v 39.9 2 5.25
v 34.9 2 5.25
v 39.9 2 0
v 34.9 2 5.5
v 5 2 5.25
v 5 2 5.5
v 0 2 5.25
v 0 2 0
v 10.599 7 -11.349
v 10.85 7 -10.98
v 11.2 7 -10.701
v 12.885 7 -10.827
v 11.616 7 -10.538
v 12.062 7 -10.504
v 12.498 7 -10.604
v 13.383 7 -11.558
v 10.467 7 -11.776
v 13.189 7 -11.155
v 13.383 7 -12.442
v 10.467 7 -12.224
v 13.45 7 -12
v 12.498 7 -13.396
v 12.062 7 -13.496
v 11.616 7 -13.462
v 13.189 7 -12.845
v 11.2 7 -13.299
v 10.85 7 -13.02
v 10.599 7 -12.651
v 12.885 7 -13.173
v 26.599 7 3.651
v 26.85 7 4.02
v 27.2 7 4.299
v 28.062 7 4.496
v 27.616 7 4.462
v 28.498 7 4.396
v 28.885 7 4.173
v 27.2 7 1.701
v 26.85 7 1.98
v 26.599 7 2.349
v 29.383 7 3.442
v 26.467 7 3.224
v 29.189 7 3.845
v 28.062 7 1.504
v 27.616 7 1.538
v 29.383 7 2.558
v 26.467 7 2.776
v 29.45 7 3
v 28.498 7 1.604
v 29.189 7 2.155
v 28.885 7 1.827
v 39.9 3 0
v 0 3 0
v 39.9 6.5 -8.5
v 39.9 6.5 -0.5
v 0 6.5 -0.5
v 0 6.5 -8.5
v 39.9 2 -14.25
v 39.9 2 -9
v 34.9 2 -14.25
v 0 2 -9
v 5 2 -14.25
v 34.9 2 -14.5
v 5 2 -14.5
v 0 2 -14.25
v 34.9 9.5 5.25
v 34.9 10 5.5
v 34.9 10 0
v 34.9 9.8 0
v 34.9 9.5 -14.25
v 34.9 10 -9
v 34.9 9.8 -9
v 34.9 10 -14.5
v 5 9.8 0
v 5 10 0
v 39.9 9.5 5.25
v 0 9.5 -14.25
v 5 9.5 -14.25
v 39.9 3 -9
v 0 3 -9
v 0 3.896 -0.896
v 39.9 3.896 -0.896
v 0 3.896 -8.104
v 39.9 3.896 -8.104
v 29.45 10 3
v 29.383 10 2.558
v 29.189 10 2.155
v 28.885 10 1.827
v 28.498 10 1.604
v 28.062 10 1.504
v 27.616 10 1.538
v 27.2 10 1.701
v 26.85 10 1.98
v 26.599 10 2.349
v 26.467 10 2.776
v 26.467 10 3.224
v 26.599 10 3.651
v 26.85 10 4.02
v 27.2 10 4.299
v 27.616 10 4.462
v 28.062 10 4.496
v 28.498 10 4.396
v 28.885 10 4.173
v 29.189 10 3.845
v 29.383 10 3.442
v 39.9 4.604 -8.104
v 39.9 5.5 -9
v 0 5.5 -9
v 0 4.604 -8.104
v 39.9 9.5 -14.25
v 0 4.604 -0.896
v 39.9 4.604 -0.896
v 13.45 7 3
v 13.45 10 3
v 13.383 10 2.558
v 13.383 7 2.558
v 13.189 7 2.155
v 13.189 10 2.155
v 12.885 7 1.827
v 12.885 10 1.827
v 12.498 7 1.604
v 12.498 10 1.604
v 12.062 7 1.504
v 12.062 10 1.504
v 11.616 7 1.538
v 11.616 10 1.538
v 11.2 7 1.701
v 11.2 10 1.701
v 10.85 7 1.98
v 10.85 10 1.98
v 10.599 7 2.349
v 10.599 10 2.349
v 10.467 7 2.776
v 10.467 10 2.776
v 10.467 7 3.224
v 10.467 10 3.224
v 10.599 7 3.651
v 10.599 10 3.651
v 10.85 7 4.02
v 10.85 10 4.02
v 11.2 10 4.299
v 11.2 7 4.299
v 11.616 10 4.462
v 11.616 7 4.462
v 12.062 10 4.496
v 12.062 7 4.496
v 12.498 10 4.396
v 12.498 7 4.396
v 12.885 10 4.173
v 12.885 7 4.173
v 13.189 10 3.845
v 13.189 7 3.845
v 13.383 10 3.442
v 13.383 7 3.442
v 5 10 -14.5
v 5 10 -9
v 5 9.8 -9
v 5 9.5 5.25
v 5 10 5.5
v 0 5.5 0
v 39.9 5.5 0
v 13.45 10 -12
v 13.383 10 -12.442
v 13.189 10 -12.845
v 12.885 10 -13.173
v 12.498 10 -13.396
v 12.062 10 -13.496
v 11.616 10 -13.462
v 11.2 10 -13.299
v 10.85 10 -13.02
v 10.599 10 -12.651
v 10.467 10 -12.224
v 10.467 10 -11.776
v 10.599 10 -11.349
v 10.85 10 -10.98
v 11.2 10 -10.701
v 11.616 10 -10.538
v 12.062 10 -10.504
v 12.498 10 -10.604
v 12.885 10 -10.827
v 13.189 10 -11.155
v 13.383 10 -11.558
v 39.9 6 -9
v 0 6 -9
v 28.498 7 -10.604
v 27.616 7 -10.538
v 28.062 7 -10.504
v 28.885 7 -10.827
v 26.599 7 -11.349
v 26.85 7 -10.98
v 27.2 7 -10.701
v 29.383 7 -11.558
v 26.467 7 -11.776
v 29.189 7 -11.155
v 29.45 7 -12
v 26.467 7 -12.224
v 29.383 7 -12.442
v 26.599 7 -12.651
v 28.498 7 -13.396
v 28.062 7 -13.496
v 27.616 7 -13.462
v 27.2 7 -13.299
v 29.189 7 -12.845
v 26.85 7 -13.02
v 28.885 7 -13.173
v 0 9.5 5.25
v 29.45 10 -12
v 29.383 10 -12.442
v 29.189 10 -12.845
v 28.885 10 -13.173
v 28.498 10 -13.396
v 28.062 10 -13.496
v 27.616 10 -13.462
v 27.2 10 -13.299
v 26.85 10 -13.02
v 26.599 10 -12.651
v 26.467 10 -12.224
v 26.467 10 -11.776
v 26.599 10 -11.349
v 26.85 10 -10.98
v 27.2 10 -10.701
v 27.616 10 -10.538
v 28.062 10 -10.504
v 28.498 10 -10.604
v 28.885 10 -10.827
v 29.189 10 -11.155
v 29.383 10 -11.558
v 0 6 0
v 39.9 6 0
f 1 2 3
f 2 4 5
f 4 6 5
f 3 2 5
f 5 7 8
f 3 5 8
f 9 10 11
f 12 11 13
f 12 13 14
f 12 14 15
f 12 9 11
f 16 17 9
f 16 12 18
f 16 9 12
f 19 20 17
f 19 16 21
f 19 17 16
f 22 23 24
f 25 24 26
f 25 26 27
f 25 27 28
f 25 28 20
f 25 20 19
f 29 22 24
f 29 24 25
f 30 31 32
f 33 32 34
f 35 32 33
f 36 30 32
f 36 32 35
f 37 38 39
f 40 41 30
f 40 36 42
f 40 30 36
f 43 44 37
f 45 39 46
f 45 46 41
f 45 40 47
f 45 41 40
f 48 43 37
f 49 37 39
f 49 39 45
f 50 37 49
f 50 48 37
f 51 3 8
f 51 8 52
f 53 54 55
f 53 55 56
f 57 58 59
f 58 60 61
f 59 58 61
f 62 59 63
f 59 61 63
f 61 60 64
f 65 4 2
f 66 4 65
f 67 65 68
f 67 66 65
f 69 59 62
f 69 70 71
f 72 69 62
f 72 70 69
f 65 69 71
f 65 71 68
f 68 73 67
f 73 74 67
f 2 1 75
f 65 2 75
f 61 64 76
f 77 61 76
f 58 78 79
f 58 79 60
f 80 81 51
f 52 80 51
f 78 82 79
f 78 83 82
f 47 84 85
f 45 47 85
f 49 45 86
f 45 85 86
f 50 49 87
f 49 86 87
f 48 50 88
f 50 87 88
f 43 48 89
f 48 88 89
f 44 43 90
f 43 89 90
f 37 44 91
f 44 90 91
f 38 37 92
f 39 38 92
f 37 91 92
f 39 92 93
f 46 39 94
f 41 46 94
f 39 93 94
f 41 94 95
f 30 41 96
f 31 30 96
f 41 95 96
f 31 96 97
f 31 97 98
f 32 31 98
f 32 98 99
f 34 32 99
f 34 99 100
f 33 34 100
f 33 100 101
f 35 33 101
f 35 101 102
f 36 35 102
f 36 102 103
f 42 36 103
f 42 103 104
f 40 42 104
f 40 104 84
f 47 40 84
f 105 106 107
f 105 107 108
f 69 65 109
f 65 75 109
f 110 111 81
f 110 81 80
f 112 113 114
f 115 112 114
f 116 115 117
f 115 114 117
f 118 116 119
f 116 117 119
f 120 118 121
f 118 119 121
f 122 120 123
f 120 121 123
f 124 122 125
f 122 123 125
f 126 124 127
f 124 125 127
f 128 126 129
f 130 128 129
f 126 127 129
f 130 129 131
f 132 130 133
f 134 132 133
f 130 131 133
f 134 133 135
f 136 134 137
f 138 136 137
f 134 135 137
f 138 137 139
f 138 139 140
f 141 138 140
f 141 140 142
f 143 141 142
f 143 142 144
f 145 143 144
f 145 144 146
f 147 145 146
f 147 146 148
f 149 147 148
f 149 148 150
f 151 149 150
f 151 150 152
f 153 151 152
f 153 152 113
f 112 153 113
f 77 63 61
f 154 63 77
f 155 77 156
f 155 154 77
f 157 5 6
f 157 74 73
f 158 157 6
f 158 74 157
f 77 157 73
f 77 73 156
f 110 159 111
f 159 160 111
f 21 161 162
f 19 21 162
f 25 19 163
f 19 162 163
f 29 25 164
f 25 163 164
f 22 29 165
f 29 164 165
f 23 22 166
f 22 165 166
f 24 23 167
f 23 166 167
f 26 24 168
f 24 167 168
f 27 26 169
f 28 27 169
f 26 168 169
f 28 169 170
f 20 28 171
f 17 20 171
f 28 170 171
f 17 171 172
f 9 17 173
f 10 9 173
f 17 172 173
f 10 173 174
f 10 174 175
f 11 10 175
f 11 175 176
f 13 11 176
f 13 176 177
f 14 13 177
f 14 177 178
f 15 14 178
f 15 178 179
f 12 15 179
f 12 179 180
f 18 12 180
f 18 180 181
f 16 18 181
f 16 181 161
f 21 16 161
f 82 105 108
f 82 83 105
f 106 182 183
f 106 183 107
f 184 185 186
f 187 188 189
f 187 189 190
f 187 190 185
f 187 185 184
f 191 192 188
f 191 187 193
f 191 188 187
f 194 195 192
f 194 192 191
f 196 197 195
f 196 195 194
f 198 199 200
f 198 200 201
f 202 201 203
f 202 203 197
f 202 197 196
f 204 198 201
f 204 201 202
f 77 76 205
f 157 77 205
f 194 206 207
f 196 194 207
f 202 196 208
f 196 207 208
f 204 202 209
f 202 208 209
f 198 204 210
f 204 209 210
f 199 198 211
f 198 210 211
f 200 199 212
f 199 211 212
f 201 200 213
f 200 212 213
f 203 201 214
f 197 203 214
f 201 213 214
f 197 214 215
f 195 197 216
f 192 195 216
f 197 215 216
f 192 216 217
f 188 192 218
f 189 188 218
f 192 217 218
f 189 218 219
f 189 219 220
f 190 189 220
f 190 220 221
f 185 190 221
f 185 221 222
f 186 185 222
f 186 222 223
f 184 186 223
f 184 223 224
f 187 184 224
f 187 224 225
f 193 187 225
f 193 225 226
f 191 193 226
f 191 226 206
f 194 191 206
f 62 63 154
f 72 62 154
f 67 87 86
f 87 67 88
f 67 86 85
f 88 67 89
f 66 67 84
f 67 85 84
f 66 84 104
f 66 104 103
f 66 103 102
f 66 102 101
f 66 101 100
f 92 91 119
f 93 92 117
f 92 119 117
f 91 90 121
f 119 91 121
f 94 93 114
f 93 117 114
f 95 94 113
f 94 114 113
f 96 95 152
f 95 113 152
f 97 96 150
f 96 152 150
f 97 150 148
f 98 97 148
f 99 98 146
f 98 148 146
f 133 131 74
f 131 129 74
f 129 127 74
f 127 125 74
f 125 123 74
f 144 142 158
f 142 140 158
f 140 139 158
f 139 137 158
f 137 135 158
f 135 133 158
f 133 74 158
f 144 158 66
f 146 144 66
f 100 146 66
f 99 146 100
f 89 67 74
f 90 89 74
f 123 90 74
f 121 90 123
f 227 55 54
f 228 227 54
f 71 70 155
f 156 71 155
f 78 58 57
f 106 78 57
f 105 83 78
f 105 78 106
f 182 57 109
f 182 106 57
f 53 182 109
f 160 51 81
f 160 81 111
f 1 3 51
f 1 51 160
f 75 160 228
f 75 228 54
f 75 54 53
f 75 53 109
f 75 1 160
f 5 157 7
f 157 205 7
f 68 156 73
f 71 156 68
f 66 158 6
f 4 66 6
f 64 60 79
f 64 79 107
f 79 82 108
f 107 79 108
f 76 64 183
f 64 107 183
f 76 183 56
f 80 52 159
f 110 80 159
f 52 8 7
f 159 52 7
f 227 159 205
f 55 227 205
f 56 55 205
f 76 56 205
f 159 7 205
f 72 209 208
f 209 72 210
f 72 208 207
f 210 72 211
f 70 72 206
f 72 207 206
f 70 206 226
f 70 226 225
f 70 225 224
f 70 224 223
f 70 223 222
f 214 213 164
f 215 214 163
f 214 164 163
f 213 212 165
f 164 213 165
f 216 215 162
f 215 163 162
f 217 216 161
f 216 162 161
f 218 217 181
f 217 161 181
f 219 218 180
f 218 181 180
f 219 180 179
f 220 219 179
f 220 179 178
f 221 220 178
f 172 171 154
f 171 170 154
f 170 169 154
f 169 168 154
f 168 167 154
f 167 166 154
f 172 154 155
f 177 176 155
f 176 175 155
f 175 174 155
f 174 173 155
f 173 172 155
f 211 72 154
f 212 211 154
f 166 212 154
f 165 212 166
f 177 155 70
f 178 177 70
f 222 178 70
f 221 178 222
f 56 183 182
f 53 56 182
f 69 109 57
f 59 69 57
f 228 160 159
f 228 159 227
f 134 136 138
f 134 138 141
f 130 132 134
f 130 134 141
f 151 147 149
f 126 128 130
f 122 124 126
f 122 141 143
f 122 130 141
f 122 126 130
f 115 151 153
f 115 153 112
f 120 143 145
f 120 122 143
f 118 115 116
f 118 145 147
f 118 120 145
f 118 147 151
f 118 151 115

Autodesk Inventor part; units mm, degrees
ref_plane "YZ Plane" through (0, 0, 0) normal (1, 0, 0) x (0, 1, 0)
ref_plane "XZ Plane" through (0, 0, 0) normal (0, 1, 0) x (-1, 0, 0)
sketch "Sketch1" plane through (0, 0, 0) normal (1, 0, 0) x (0, 1, 0)
  line L0 (0, 0) -> (2, 0)
  line L1 (6.5, 0) -> (6.5, -9)
  line L2 (6.5, -9) -> (2, -9)
  line L3 (0, -9) -> (0, 0)
  line L4 (10, 5.5) -> (2, 5.5)
  line L5 (2, 5.5) -> (2, 0)
  line L6 (2, -14.5) -> (10, -14.5)
  line L7 (10, -14.5) -> (10, 5.5)
  line L8 (10, -4.5) -> (6.5, -4.5)
  line L9 (2, 0) -> (6.5, 0)
  line L10 (2, 0) -> (2, -14.5)
  line L11 (2, -9) -> (0, -9)
  dimension "d0" = 6.5
  dimension "d1" = 9
  dimension "d3" = 10
  dimension "d4" = 20
  dimension "d5" = 2
extrude "Extrusion1" add sketch "Sketch1" along normal blind 39.9 contours L5 L4 L7 L8 L1 L9 | L2 L1 L8 L7 L6 L10
sketch "Sketch2" plane through (39.9, 0, 0) normal (1, 0, 0) x (0, 0, -1)
  line L0 (0, 6.5) -> (9, 6.5) projected
  line L1 (9, 6.5) -> (9, 2) projected
  line L2 (9, 2) -> (14.5, 2) projected
  line L3 (14.5, 2) -> (14.5, 10) projected
  line L4 (14.5, 10) -> (-5.5, 10) projected
  line L5 (-5.5, 10) -> (-5.5, 2) projected
  line L6 (-5.5, 2) -> (0, 2) projected
  line L7 (0, 2) -> (0, 6.5) projected
  line L8 (0, 5.5) -> (1.25, 4.25)
  line L9 (1.25, 4.25) -> (0, 3)
  line L10 (9, 5.5) -> (7.75, 4.25)
  line L11 (7.75, 4.25) -> (9, 3)
  line L12 (9, 6.5) -> (9, 2) projected
  line L13 (9, 5.5) -> (0, 5.5)
  line L14 (0, 3) -> (9, 3)
  point P0 (0, 0)
  dimension "d8" = 90
  dimension "d9" = 45
  dimension "d10" = 3.5
  dimension "d11" = 1
  dimension "d12" = 45
extrude "Extrusion2" add sketch "Sketch2" against normal up to surface (39.9 mm away) contours L8 L9 L7 | L1 L11 L10
chamfer "Chamfer1" distance 0.5 angle 45 4 edges at (19.95, 6.5, -9) (19.95, 6.5, 0) (19.95, 4.25, -1.25) (19.95, 4.25, -7.75)
sketch "Sketch3" plane through (0, 10, 5.5) normal (0, 1, 0) x (1, 0, 0)
  line L0 (0, 20) -> (0, 0) projected
  line L1 (0, 0) -> (39.9, 0) projected
  line L2 (39.9, 20) -> (39.9, 0) projected
  line L3 (0, 20) -> (39.9, 20) projected
  line L4 (0, 0) -> (39.9, 20) construction
  line L5 (27.95, 2.5) -> (11.95, 2.5)
  line L6 (11.95, 2.5) -> (11.95, 17.5)
  line L7 (11.95, 17.5) -> (27.95, 17.5)
  line L8 (27.95, 17.5) -> (27.95, 2.5)
  line L9 (27.95, 2.5) -> (11.95, 17.5) construction
  line L10 (11.95, 2.5) -> (27.95, 17.5) construction
  circle A0 centre (11.95, 17.5) radius 1.5
  circle A1 centre (27.95, 17.5) radius 1.5
  circle A2 centre (27.95, 2.5) radius 1.5
  circle A3 centre (11.95, 2.5) radius 1.5
  point P0 (0, 5.5)
  point P1 (19.95, 10)
  dimension "d18" = 16
  dimension "d19" = 15
  dimension "d20" = 3
  dimension "d21" = 3
  dimension "d22" = 3
  dimension "d23" = 3
extrude "Extrusion3" cut sketch "Sketch3" against normal blind 3 contours A3 L6 L5 | L5 L6 A3 | A2 L8 L5 | L5 L8 A2 | A0 L7 L6 | L6 L7 A0 | A1 L7 L8 | L8 L7 A1
sketch "Sketch4" plane through (0, 10, 5.5) normal (0, 1, 0) x (1, 0, 0)
  circle A0 centre (11.95, 2.5) radius 1.5 projected
  circle A1 centre (27.95, 17.5) radius 1.5 projected
  circle A2 centre (11.95, 17.5) radius 1.5 projected
  circle A3 centre (27.95, 2.5) radius 1.5 projected
  line L0 (0, 20) -> (0, 0) projected
  line L1 (0, 0) -> (39.9, 0) projected
  line L2 (39.9, 20) -> (39.9, 0) projected
  line L3 (0, 20) -> (39.9, 20) projected
  line L4 (39.9, 20) -> (39.9, 0) projected
  line L5 (0, 5.5) -> (39.9, 5.5)
  line L6 (39.9, 5.5) -> (39.9, 14.5)
  line L7 (39.9, 14.5) -> (0, 14.5)
  line L8 (0, 14.5) -> (0, 5.5)
  line L9 (0, 14.5) -> (39.9, 14.5) projected
extrude "Extrusion4" cut sketch "Sketch4" against normal blind 0.2 contours L7 L2 L5 L0
sketch "Sketch5" plane through (39.9, 0, 0) normal (1, 0, 0) x (0, 0, -1)
  line L0 (0, 9.8) -> (0, 10) projected
  line L1 (0, 10) -> (-5.5, 10) construction
  line L2 (-5.5, 10) -> (-5.5, 2) projected
  line L3 (-5.5, 2) -> (0, 2) projected
  line L4 (0, 2) -> (0, 3) projected
  line L5 (0, 3) -> (0.8964, 3.8964) projected
  line L6 (0.8964, 4.6036) -> (0.8964, 3.8964) projected
  line L7 (0.8964, 4.6036) -> (0, 5.5) projected
  line L8 (0, 5.5) -> (0, 6) construction
  line L9 (0.5, 6.5) -> (0, 6) construction
  line L10 (0.5, 6.5) -> (8.5, 6.5) projected
  line L11 (9, 6) -> (8.5, 6.5) projected
  line L12 (9, 6) -> (9, 5.5) projected
  line L13 (9, 5.5) -> (8.1036, 4.6036) construction
  line L14 (8.1036, 3.8964) -> (8.1036, 4.6036) construction
  line L15 (8.1036, 3.8964) -> (9, 3) construction
  line L16 (9, 3) -> (9, 2) projected
  line L17 (9, 2) -> (14.5, 2) projected
  line L18 (14.5, 2) -> (14.5, 10) projected
  line L19 (14.5, 10) -> (9, 10) projected
  line L20 (9, 10) -> (9, 9.8) projected
  line L21 (9, 9.8) -> (0, 9.8) projected
  line L22 (-5.25, 9.5) -> (14.25, 9.5)
  line L23 (14.25, 9.5) -> (14.25, 2)
  line L24 (14.25, 2) -> (-5.25, 2)
  line L25 (-5.25, 2) -> (-5.25, 9.5)
  circle A0 centre (4.5, 2) radius 50
  point P0 (0, 0)
  dimension "d28" = 0.25
  dimension "d29" = 0.25
  dimension "d30" = 0.5
  dimension "d31" = 100
extrude "Extrusion5" cut sketch "Sketch5" against normal blind 5
ref_plane "Work Plane1" through (19.95, 0, 0) normal (1, 0, 0) x (0, 0, -1)
mirror "Mirror1" about plane through (19.95, 0, 0) normal (1, 0, 0) of "Extrusion5"
properties part number "mgn9h_carriage"
